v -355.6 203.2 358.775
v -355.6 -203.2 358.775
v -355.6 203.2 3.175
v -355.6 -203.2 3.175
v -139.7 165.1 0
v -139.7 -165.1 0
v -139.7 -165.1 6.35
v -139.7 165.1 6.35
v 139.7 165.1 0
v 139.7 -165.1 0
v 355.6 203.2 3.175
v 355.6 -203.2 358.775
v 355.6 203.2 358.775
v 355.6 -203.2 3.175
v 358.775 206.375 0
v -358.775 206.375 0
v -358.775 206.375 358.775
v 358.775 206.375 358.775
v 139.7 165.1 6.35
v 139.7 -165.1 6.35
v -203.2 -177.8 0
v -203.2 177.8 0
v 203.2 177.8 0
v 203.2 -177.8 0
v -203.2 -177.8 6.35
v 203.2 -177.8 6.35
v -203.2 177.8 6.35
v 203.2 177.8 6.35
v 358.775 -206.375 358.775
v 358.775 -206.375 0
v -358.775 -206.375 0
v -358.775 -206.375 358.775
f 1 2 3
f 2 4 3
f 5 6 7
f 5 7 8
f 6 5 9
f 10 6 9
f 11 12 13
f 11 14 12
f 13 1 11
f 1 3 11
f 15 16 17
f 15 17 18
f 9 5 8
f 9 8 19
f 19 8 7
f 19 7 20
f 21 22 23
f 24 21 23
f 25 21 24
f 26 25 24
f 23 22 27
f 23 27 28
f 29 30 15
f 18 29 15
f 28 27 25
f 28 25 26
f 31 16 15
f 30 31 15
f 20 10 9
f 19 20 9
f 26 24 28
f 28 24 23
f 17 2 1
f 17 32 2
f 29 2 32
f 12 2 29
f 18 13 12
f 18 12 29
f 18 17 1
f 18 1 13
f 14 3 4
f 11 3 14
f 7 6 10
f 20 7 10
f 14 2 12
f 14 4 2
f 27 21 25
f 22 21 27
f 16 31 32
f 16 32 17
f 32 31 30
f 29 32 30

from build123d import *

# Parameters (mm, degrees)
F0_W     = 717.55
F0_H     = 412.75
F1_DEPTH = 358.775
F2_T     = -3.175
F3_W     = 406.4
F3_H     = 355.6
F4_DEPTH = 6.35
F5_W     = 279.4
F5_H     = 330.2
F6_DEPTH = 6.35


with BuildPart() as f1:
    # F0 (on Top) → F1 (new body)
    with BuildSketch(Plane.XY):
        Rectangle(F0_W, F0_H)
    extrude(amount=F1_DEPTH)

    # F2
    f2_openings = [f1.faces().sort_by_distance(p)[0] for p in [
        (0, 0, 358.775),
    ]]
    offset(amount=F2_T, openings=f2_openings)


with BuildPart() as f4:
    # F3 (on Top) → F4 (new body)
    with BuildSketch(Plane.XY):
        Rectangle(F3_W, F3_H)
    extrude(amount=F4_DEPTH)


with BuildPart() as f6:
    # F5 (on Top) → F6 (new body)
    with BuildSketch(Plane.XY):
        Rectangle(F5_W, F5_H)
    extrude(amount=F6_DEPTH)


solid = Compound([f1.part, f4.part, f6.part])
